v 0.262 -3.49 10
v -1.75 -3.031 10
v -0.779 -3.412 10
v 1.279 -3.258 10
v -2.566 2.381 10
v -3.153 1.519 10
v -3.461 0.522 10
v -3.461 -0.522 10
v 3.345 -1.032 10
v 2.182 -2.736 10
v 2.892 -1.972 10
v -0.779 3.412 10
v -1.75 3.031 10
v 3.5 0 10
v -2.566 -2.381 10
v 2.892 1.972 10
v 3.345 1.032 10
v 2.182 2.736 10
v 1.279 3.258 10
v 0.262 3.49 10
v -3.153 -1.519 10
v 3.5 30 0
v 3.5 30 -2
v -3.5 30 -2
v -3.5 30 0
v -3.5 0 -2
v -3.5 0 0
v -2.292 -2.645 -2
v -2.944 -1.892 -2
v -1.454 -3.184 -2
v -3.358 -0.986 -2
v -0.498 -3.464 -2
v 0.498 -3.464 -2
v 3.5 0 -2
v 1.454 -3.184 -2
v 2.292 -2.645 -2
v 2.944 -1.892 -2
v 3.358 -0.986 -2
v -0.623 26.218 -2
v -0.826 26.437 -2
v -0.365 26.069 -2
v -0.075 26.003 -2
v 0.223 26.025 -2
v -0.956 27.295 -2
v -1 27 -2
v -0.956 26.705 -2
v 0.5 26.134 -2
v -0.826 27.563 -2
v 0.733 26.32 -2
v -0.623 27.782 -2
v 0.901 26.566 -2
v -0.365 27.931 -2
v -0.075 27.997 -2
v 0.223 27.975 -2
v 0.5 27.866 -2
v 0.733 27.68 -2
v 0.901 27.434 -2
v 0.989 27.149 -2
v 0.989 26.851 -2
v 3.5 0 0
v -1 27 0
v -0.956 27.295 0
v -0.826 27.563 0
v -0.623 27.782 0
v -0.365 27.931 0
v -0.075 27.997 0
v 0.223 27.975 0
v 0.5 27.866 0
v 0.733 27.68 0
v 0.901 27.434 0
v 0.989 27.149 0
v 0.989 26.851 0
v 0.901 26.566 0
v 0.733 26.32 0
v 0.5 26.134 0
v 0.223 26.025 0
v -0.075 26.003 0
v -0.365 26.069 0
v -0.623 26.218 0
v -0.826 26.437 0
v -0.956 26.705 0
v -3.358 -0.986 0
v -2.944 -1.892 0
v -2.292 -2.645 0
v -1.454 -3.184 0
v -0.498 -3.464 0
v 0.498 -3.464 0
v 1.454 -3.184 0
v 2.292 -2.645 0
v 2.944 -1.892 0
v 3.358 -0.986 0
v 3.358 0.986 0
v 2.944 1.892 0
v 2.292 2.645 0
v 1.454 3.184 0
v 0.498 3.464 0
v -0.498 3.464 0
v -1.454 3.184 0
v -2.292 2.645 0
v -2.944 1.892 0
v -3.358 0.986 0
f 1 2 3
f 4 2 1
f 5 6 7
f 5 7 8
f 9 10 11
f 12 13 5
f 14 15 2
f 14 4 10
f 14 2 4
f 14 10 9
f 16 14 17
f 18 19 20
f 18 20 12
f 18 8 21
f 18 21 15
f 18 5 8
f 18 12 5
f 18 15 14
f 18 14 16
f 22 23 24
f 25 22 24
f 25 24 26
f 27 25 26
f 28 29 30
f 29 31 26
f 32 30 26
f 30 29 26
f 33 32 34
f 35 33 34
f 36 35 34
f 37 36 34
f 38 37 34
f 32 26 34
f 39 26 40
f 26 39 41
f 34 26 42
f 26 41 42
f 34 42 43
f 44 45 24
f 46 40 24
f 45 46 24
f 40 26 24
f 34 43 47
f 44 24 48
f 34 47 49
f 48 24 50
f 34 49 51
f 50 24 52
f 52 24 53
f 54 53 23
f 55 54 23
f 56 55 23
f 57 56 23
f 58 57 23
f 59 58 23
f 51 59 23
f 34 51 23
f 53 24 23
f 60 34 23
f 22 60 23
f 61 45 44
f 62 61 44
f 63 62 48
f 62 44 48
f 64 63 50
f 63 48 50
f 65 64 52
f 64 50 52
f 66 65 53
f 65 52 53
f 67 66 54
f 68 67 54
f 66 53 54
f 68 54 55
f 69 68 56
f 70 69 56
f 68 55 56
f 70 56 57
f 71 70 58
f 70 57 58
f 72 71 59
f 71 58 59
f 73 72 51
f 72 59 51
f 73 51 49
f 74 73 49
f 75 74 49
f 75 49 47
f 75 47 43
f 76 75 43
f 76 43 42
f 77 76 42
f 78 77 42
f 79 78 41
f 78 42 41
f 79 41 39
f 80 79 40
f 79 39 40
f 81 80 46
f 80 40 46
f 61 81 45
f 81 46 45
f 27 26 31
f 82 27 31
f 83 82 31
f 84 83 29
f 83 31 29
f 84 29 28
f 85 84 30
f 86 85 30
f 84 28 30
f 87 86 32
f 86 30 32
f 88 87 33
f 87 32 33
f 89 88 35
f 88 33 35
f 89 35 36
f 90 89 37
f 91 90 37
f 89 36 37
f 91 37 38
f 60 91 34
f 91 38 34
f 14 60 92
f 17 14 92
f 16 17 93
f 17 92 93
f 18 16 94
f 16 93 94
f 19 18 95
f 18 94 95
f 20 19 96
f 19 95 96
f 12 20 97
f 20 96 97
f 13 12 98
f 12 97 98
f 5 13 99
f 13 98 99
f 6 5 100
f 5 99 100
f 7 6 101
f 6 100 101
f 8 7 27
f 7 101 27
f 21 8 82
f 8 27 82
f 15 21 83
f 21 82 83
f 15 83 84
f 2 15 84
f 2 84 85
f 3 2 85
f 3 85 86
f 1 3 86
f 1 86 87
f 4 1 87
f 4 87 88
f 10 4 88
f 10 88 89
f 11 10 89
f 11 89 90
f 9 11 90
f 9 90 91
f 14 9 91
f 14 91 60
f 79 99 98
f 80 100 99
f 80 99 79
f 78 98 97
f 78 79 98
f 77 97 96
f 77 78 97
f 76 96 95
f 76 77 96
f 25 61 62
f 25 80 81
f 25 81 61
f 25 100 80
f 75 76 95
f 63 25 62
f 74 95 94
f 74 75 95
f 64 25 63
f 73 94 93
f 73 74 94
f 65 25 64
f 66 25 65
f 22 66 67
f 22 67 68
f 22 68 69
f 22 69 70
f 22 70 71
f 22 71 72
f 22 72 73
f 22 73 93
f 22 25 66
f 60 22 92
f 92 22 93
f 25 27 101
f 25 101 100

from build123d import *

# Parameters (mm, degrees)
SKETCH1_R           = 3.5
BOSS_EXTRUDE1_DEPTH = 10
BOSS_EXTRUDE2_START = 2
SKETCH2_R           = 1
BOSS_EXTRUDE2_DEPTH = 2


with BuildPart() as part:
    # Sketch1 → Boss-Extrude1 (new body)
    with BuildSketch(Plane.XY):
        Circle(SKETCH1_R)
    extrude(amount=BOSS_EXTRUDE1_DEPTH)

    # Sketch2 → Boss-Extrude2 (add)
    with BuildSketch(Plane(origin=(0, 0, 0), x_dir=(-1, 0, 0), z_dir=(0, 0, -1)).offset(BOSS_EXTRUDE2_START)):
        with BuildLine():
            Line((-3.5, 0), (-3.5, 30))
            Line((-3.5, 30), (3.5, 30))
            Line((3.5, 30), (3.5, 0))
            ThreePointArc((3.5, 0), (0, -3.5), (-3.5, 0))
        make_face()
        with Locations((0, 27)):
            Circle(SKETCH2_R, mode=Mode.SUBTRACT)
    extrude(amount=-BOSS_EXTRUDE2_DEPTH)


solid = part.part
